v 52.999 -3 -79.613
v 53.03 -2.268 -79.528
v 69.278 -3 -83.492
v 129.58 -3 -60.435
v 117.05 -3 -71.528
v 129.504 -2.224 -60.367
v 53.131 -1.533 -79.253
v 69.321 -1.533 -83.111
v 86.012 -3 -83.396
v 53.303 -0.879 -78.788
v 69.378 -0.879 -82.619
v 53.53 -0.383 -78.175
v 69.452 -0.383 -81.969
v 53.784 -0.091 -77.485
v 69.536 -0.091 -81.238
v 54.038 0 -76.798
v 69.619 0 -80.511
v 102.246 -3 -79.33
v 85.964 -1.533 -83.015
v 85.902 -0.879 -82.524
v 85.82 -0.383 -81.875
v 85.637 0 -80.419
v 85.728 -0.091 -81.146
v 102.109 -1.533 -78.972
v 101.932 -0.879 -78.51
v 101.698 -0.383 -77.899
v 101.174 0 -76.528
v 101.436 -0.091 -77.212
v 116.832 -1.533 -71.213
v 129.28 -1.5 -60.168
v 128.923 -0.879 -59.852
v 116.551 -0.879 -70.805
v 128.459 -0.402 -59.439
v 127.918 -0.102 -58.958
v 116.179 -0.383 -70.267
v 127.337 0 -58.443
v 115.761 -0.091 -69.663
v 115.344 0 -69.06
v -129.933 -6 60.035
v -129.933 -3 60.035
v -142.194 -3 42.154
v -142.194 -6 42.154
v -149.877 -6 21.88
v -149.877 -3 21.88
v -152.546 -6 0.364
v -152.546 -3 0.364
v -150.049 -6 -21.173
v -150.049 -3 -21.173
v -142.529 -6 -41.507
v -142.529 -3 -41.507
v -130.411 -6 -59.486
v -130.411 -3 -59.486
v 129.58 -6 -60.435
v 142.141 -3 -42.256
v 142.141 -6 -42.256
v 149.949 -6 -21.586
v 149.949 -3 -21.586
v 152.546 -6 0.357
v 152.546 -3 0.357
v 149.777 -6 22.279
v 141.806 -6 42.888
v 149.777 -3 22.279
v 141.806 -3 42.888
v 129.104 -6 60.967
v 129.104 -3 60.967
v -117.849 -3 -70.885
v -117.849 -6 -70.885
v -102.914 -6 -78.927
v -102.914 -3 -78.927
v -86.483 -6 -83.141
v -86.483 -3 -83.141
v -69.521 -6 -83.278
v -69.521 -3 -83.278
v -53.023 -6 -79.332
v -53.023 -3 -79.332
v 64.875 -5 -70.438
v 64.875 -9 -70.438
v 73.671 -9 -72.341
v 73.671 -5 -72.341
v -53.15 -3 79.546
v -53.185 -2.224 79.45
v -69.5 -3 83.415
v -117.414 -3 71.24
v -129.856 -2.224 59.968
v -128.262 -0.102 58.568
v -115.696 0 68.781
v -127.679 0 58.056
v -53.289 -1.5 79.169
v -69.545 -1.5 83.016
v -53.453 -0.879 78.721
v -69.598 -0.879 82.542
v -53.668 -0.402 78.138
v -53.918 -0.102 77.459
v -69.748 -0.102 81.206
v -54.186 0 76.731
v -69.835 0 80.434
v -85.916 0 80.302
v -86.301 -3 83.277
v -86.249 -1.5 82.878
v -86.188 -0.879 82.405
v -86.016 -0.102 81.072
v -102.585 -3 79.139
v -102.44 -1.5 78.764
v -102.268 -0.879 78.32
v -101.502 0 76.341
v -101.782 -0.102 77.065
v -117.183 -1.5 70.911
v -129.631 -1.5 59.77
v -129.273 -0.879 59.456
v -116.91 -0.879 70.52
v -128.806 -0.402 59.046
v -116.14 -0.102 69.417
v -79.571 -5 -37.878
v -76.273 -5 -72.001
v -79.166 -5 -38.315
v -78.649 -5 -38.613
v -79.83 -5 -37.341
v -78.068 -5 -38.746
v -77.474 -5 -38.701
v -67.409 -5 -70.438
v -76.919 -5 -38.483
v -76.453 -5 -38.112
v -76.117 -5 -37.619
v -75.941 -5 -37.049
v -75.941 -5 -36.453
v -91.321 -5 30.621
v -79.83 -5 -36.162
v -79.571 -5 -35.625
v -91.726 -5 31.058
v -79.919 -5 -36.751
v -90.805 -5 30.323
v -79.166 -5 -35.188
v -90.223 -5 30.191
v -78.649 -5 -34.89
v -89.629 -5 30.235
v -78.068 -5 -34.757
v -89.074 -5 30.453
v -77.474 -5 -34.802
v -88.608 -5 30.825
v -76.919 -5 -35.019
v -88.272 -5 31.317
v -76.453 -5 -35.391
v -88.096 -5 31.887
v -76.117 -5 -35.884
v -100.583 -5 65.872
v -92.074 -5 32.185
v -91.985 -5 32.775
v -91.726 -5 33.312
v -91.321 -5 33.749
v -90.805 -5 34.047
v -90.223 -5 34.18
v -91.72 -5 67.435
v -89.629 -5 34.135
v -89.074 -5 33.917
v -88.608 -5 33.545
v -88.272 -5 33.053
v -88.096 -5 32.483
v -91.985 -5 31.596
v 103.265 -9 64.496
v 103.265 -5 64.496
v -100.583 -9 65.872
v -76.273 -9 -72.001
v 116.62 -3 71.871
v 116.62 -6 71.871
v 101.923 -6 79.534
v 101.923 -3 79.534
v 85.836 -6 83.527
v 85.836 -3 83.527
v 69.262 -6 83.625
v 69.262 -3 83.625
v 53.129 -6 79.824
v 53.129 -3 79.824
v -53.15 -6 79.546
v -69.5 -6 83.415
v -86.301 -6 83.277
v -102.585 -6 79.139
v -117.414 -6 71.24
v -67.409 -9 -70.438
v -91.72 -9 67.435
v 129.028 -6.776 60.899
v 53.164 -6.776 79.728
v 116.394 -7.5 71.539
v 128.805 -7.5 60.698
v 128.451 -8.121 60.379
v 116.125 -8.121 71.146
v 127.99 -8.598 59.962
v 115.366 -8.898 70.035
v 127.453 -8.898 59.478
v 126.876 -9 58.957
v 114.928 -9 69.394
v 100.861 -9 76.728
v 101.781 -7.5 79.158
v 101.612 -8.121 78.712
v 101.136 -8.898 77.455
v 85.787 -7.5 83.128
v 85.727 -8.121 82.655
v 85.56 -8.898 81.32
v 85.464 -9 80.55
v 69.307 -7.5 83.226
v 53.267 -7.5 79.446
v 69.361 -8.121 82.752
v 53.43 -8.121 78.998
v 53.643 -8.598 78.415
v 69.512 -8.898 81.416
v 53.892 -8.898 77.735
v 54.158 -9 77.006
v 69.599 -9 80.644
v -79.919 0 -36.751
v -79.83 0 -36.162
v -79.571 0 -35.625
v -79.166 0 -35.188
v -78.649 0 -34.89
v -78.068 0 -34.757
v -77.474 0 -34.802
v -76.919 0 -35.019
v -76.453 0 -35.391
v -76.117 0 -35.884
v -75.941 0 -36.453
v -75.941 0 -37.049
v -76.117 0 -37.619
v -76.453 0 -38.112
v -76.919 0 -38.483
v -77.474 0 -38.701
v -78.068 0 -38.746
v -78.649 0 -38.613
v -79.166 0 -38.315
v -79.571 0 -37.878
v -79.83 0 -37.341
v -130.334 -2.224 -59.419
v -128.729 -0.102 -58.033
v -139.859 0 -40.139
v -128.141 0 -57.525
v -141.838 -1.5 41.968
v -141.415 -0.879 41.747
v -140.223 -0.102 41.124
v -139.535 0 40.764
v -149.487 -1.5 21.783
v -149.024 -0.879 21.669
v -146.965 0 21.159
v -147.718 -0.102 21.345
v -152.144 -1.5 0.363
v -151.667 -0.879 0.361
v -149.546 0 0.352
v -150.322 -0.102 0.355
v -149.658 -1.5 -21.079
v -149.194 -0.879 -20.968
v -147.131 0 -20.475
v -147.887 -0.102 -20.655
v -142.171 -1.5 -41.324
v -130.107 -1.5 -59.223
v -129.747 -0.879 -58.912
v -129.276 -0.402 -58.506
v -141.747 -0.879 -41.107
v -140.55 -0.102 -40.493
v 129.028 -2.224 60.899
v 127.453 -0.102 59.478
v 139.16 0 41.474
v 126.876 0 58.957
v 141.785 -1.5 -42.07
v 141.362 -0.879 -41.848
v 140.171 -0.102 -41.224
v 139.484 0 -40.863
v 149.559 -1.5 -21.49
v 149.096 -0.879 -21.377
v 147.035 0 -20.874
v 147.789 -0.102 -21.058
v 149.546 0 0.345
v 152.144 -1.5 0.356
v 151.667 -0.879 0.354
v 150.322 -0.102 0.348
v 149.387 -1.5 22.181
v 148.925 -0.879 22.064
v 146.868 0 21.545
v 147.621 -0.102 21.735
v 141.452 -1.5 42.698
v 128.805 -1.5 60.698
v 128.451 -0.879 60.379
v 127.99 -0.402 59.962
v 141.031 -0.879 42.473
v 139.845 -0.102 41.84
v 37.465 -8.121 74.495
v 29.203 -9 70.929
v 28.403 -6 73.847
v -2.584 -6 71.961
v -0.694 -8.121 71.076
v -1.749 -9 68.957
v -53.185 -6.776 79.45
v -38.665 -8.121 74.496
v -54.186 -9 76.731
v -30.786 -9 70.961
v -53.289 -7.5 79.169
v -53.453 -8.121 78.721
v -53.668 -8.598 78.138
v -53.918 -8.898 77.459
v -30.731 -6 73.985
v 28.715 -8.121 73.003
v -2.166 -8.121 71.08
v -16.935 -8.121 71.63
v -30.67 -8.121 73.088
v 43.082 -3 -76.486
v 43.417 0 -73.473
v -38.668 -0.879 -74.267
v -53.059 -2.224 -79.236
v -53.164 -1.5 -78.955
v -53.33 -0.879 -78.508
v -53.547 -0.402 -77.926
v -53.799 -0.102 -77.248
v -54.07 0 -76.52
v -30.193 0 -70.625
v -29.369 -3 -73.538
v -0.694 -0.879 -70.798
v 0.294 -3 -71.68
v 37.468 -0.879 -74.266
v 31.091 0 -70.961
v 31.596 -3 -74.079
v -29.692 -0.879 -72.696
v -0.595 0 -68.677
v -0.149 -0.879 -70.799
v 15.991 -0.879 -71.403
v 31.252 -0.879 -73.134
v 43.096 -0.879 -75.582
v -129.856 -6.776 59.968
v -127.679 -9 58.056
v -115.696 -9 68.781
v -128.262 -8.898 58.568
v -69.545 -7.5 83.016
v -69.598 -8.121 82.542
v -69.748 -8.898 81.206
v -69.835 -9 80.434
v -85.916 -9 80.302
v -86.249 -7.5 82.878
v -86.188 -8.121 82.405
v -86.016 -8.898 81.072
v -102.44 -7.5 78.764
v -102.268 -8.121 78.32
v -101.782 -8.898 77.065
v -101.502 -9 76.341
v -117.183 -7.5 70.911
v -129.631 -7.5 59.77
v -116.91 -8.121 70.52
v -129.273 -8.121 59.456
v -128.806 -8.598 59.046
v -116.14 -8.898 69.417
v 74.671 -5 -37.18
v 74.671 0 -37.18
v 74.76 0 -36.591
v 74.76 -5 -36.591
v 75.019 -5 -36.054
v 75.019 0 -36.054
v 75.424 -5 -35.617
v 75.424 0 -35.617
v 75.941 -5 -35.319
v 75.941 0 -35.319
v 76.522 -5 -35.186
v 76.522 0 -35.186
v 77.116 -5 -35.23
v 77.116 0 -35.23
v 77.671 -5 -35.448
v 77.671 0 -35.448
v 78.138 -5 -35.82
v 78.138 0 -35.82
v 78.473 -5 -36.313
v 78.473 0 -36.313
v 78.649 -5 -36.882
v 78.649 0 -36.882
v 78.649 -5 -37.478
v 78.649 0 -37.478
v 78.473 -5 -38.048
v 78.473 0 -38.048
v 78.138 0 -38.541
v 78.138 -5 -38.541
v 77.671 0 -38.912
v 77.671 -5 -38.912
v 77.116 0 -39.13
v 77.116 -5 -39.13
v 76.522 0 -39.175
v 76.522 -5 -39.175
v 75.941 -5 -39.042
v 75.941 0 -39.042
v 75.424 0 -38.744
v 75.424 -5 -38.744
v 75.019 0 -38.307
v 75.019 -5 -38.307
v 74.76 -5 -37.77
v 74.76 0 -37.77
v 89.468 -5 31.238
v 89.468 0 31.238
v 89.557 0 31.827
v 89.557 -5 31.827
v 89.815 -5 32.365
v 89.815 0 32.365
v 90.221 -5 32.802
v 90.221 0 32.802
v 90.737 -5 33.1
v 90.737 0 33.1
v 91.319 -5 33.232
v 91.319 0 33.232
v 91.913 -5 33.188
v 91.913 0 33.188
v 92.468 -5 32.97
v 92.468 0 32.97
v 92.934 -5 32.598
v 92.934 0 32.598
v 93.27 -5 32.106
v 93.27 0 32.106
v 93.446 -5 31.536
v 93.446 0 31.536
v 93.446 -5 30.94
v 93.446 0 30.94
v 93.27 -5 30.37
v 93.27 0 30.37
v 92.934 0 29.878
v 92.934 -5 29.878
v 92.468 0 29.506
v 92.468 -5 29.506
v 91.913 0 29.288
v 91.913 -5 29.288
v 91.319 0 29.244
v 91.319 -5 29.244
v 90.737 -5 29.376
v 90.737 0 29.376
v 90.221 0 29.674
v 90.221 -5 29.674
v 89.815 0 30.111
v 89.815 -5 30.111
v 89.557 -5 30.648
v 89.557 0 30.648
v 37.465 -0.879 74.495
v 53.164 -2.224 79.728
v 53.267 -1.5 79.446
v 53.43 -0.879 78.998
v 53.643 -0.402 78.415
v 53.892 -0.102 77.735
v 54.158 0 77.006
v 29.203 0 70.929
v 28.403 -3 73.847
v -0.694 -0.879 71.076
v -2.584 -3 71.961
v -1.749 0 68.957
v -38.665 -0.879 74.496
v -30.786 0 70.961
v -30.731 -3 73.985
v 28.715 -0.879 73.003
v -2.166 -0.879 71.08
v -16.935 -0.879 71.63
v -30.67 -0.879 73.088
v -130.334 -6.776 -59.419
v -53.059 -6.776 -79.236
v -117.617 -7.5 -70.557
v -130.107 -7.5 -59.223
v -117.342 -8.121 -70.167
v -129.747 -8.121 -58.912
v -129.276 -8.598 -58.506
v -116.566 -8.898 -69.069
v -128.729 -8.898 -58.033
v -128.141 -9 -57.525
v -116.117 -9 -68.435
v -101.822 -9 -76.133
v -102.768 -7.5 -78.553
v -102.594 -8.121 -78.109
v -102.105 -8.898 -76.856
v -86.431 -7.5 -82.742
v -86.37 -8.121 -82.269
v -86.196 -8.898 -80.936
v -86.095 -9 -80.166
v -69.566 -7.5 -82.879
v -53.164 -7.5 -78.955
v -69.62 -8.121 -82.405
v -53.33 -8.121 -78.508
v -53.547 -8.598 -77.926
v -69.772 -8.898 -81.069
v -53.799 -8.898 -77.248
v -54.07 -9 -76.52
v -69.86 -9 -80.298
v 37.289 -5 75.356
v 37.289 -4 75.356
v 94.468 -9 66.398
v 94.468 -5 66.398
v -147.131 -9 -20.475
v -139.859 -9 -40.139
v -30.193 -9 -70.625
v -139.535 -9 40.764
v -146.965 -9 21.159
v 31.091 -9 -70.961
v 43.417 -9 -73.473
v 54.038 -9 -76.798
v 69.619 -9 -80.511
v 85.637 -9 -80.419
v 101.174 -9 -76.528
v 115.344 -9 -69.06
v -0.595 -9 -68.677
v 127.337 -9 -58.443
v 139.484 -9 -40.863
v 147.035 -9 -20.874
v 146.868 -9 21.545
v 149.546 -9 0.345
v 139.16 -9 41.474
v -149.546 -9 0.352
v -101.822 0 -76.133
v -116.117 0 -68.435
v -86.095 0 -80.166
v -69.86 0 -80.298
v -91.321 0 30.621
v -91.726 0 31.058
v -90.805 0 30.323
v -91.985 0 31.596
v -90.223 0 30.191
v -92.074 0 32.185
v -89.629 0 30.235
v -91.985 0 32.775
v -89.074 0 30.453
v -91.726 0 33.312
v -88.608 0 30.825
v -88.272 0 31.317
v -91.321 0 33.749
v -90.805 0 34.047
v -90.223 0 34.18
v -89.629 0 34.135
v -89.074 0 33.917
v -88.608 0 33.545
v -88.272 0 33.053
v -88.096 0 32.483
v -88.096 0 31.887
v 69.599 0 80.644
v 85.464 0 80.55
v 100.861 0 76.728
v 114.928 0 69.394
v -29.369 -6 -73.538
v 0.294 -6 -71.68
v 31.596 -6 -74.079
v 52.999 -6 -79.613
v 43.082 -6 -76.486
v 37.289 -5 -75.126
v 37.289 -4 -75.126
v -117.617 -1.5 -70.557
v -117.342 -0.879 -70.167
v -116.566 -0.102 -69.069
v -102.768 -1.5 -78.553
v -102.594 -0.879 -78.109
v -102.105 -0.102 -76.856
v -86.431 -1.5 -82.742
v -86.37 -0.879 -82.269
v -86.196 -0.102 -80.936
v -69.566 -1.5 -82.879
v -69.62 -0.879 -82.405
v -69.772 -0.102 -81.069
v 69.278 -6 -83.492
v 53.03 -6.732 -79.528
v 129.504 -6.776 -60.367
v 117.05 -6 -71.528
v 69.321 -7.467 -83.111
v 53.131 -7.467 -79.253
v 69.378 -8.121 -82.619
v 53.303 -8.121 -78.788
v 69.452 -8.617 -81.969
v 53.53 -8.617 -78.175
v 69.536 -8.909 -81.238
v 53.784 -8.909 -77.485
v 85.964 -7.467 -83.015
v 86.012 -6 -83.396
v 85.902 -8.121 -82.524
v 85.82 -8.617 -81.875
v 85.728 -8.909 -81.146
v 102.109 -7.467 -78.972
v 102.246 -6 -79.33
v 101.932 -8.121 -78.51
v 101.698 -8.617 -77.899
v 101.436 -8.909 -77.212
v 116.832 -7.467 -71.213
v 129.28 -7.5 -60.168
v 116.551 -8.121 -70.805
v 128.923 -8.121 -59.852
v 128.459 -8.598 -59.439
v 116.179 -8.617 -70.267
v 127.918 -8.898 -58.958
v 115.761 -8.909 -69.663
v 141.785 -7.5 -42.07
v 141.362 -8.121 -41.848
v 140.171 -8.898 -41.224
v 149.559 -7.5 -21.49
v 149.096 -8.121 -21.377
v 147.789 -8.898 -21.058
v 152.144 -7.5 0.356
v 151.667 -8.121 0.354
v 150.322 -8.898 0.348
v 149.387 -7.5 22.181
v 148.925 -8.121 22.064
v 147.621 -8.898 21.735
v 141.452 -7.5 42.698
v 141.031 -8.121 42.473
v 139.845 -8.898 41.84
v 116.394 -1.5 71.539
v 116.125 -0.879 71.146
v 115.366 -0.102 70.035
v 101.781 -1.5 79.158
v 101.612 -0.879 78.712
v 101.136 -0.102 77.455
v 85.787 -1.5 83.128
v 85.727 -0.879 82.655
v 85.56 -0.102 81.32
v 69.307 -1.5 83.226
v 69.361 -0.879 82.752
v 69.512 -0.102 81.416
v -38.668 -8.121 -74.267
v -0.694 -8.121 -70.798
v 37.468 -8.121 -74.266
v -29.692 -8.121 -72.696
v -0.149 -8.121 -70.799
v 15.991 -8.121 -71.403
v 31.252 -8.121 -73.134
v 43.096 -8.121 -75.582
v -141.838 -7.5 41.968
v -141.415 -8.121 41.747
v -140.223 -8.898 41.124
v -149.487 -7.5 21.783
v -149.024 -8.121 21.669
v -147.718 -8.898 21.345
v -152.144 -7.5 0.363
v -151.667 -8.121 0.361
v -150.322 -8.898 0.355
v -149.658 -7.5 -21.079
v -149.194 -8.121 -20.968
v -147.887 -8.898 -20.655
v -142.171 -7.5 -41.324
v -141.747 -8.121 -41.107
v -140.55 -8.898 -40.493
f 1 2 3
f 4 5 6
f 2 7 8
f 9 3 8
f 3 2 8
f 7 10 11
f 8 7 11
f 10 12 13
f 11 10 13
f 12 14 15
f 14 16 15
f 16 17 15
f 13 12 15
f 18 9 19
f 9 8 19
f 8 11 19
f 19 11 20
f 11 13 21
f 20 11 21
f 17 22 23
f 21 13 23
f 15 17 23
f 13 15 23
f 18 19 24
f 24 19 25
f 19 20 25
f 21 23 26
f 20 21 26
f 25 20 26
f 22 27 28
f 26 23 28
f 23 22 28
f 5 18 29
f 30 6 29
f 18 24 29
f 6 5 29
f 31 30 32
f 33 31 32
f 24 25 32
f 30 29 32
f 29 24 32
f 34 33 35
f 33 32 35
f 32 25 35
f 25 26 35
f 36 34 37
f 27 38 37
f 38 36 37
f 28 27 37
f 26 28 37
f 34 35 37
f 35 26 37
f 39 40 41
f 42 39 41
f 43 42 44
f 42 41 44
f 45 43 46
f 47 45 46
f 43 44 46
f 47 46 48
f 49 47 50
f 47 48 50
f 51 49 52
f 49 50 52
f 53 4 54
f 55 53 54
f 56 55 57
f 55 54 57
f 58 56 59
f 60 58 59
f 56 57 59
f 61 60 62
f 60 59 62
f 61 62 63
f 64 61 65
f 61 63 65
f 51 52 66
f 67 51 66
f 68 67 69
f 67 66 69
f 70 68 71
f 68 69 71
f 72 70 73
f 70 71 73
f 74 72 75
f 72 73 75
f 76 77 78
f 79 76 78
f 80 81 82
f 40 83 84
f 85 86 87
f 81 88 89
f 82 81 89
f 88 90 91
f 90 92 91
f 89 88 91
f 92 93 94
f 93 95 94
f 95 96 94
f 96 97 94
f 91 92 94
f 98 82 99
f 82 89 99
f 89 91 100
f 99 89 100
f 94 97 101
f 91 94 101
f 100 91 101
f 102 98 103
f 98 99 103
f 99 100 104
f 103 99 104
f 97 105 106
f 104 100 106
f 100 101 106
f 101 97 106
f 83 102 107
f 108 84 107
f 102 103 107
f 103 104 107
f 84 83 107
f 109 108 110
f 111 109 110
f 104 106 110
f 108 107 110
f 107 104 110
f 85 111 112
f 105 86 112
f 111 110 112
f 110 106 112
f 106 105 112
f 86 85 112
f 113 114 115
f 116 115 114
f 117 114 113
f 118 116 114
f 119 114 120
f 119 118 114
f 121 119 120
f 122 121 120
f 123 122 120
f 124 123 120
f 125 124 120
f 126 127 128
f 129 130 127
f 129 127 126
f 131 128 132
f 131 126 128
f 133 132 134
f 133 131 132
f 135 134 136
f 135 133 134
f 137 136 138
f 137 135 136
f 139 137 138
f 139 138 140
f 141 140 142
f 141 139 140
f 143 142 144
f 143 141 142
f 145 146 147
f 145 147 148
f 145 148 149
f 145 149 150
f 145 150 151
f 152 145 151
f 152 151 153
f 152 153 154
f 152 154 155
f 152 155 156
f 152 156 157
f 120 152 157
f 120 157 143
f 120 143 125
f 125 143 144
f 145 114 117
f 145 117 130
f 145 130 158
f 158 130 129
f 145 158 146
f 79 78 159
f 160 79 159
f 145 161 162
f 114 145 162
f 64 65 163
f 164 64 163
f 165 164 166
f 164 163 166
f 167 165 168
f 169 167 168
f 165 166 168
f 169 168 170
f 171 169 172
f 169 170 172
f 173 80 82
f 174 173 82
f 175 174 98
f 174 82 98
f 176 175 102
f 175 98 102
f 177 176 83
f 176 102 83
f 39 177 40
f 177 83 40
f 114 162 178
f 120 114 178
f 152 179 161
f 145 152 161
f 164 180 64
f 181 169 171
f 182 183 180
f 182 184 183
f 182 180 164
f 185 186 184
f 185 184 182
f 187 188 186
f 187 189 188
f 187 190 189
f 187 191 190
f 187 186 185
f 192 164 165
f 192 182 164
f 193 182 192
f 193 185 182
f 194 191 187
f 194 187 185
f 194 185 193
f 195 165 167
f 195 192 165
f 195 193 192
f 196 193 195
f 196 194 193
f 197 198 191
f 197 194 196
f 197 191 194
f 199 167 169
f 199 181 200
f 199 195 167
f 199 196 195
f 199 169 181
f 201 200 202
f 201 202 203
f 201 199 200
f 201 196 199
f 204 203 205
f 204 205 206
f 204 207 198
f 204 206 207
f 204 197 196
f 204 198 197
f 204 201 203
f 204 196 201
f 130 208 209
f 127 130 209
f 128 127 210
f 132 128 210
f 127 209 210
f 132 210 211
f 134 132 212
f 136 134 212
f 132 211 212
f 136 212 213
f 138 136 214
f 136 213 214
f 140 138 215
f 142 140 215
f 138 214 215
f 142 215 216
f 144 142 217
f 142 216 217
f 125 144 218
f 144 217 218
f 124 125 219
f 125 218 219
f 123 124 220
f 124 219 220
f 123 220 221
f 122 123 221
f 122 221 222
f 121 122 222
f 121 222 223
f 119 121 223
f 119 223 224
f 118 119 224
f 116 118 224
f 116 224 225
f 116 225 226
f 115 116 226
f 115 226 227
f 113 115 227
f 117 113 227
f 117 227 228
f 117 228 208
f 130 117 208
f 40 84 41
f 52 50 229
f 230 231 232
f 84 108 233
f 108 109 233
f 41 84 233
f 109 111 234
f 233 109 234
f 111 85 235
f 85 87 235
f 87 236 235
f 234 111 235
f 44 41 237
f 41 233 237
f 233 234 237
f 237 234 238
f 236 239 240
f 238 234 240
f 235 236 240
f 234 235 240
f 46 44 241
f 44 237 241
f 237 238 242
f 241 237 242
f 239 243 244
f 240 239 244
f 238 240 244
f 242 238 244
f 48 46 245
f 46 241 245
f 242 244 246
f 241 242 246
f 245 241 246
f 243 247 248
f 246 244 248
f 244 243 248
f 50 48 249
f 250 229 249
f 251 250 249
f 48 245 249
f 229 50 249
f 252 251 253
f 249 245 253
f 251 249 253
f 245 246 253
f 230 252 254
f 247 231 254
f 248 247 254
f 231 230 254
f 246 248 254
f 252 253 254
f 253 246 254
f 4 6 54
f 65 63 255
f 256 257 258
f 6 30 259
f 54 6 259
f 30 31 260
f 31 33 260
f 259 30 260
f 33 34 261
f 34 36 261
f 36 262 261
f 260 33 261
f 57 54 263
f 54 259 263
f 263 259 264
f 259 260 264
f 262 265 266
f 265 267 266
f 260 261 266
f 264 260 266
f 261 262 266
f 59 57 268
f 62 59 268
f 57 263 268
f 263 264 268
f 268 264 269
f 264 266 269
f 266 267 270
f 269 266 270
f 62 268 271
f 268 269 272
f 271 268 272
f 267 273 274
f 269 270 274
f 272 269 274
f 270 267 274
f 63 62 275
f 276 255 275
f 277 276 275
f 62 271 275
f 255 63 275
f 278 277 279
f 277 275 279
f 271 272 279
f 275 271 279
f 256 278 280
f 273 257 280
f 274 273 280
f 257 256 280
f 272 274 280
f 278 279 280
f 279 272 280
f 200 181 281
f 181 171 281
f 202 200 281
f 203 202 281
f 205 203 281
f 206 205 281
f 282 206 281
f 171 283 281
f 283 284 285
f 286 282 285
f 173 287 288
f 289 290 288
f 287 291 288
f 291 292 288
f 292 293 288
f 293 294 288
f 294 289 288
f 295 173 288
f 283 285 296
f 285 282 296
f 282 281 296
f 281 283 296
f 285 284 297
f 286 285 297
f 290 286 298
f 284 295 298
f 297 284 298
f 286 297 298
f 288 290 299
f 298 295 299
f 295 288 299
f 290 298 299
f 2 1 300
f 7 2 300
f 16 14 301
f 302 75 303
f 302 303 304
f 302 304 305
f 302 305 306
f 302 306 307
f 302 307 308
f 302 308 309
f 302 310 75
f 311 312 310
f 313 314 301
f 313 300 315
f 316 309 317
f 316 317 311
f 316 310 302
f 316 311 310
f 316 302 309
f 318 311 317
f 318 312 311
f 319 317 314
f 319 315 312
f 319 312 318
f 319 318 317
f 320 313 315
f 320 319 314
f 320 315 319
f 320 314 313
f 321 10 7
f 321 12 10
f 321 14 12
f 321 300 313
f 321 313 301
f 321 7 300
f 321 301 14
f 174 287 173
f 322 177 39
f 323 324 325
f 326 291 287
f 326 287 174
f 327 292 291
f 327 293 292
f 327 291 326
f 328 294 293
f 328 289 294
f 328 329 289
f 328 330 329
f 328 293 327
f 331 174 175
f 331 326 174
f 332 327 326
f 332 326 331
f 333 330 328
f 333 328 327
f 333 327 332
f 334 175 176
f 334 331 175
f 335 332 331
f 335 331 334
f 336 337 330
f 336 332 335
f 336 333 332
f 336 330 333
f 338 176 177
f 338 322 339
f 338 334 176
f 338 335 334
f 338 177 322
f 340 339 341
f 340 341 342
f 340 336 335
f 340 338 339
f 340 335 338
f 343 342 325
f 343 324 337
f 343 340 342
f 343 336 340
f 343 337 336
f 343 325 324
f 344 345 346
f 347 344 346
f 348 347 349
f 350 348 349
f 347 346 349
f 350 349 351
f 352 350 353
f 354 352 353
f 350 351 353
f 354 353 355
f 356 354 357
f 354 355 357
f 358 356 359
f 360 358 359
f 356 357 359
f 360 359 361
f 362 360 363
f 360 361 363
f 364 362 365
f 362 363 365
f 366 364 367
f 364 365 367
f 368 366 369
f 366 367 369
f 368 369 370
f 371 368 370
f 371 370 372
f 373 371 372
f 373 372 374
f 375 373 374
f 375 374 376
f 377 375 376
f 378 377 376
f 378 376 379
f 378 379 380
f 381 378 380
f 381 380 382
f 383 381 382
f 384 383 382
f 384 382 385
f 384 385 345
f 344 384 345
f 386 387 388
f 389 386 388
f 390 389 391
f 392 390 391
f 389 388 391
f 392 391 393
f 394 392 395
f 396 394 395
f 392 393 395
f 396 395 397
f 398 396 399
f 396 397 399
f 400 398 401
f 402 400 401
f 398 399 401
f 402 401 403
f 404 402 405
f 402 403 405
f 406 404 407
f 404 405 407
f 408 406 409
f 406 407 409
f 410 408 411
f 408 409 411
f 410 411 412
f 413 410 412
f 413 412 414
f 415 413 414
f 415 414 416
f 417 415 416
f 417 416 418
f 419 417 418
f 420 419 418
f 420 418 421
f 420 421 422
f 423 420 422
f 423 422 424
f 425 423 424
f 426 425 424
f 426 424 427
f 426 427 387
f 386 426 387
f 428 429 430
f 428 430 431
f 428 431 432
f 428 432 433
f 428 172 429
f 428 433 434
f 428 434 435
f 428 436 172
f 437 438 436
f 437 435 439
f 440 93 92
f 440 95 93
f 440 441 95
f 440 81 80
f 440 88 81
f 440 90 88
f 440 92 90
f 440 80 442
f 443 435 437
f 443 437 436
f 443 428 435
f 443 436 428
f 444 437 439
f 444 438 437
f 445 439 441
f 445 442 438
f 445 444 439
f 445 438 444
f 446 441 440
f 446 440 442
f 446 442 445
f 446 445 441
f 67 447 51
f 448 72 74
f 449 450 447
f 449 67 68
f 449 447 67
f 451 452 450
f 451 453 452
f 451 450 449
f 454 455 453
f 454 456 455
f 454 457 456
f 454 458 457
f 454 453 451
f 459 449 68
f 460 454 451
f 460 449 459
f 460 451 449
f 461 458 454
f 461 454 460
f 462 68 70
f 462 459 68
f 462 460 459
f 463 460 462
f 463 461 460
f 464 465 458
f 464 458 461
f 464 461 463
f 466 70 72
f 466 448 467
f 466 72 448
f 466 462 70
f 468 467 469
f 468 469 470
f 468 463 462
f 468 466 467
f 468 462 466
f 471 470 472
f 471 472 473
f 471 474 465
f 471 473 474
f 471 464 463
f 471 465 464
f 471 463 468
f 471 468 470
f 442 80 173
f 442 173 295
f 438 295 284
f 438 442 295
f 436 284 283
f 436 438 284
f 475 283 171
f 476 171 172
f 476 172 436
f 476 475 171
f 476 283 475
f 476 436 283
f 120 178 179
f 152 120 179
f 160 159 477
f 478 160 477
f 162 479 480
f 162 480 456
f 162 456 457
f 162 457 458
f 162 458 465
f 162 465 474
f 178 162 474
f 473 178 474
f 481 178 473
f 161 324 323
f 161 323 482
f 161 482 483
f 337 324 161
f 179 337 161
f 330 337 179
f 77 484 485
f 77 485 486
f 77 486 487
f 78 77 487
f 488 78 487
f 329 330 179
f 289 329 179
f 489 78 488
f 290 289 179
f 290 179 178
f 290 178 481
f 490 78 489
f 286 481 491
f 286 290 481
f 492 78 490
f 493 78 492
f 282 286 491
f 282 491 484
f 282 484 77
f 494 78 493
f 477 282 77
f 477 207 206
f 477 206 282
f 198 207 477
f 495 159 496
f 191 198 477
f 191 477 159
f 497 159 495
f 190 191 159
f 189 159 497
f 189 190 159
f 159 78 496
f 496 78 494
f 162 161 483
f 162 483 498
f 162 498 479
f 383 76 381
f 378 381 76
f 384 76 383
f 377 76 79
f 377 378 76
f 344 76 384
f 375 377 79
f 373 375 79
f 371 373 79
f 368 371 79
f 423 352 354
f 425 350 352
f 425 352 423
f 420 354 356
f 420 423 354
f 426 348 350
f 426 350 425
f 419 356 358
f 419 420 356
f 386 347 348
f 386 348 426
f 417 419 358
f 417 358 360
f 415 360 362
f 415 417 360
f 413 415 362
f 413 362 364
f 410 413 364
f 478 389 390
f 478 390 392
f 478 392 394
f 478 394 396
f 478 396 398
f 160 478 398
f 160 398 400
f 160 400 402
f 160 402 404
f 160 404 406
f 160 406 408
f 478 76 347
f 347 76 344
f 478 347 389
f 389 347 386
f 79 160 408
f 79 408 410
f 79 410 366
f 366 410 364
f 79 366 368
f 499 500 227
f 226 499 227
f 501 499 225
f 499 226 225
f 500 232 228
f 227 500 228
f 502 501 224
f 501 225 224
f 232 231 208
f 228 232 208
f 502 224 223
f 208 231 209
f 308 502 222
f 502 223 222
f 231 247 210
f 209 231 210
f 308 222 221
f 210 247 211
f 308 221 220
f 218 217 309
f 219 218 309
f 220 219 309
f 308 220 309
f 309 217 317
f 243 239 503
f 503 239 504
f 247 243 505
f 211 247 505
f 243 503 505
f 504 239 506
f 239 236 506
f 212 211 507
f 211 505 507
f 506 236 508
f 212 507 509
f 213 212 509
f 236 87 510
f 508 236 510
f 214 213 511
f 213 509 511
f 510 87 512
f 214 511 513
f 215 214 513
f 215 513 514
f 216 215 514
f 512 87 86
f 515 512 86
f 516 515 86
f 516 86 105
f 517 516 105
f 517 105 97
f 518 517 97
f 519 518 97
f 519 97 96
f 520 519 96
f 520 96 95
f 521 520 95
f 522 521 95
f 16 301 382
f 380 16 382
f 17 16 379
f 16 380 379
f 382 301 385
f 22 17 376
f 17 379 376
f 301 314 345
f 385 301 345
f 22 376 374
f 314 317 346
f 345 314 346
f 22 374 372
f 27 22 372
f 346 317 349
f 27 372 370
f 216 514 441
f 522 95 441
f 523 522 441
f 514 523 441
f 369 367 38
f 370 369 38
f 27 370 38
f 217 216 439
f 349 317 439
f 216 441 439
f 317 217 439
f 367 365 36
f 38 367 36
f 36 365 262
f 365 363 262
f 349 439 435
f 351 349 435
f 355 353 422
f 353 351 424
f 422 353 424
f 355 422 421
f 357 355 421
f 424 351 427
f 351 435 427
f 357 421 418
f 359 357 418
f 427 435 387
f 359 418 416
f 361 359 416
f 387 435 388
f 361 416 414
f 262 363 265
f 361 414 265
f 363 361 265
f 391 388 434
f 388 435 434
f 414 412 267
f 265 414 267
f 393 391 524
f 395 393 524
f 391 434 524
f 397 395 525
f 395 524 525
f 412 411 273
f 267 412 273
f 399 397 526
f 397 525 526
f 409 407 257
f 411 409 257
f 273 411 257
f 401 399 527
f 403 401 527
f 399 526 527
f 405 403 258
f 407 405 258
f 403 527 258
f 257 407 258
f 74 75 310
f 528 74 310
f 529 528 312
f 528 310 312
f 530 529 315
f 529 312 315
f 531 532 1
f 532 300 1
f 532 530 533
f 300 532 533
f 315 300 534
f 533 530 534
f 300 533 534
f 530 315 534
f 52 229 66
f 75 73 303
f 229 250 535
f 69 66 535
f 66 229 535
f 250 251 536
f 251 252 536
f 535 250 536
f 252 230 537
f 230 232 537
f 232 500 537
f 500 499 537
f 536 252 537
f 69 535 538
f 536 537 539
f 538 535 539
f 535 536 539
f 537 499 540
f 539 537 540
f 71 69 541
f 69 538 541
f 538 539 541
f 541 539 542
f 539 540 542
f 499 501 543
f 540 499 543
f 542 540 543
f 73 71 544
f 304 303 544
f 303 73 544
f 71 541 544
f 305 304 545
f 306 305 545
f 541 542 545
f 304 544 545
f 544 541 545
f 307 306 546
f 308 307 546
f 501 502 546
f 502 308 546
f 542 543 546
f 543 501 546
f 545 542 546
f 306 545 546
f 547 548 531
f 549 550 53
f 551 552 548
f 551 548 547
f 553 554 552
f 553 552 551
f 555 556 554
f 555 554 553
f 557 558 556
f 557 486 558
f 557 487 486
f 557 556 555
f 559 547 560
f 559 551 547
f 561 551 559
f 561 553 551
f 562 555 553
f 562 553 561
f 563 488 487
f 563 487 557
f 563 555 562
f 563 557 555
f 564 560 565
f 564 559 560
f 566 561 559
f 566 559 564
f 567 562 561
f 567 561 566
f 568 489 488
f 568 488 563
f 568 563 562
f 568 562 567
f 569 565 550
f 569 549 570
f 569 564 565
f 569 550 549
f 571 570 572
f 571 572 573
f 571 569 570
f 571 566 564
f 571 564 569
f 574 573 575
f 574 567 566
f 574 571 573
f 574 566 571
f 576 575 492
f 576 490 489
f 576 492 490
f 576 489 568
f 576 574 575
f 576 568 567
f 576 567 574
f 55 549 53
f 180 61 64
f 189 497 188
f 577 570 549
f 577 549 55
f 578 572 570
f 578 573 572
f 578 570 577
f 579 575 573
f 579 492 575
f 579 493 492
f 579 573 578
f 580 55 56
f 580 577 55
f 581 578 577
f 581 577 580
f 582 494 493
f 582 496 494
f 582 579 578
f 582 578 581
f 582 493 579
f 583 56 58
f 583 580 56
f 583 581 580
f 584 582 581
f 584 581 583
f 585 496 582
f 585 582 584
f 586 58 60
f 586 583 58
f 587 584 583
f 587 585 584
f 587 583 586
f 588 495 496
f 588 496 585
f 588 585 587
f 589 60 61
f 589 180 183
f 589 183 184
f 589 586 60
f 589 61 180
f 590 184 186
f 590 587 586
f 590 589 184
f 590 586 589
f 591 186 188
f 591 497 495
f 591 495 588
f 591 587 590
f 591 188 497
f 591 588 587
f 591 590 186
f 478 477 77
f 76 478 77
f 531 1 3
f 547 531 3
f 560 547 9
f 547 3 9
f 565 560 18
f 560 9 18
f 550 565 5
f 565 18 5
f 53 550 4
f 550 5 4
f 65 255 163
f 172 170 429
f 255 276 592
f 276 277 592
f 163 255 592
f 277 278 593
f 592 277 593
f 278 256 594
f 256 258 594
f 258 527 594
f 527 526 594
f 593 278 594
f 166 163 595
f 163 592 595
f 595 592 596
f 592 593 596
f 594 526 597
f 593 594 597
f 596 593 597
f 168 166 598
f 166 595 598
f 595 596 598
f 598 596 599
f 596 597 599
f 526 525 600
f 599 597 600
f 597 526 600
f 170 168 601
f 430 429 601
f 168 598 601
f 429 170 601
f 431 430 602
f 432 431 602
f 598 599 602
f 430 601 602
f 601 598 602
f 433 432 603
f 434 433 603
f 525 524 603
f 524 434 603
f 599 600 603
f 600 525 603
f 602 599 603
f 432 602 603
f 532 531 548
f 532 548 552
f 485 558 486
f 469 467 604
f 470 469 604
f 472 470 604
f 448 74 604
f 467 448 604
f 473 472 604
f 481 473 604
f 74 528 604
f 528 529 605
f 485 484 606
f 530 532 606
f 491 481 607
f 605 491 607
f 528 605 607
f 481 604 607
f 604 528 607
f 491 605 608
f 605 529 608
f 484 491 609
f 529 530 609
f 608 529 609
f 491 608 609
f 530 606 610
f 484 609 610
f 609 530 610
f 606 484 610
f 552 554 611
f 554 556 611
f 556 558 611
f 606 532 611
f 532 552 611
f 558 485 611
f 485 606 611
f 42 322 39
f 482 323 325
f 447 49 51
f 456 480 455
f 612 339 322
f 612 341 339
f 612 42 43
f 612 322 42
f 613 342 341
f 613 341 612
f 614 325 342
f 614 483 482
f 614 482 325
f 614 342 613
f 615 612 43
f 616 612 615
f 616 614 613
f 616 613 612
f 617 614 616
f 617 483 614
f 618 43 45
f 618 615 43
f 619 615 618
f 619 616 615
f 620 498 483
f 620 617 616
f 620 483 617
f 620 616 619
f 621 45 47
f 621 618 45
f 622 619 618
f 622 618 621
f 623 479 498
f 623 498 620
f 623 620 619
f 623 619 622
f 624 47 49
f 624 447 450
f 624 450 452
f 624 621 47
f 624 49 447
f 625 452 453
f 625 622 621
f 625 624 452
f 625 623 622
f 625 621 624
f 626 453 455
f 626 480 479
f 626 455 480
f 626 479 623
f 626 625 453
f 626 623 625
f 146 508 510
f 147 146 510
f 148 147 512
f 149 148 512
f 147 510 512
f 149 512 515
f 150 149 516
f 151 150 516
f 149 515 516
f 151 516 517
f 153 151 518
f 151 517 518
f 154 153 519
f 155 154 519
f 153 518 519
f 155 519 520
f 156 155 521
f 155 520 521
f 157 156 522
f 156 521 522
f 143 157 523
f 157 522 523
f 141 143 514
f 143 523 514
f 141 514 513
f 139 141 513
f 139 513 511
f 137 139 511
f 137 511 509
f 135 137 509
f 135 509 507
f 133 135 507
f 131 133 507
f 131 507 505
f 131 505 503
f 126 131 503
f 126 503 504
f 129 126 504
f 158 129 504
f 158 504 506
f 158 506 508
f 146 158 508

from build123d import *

# Parameters (mm, degrees)
F1_DEPTH = 9
F3_R     = 3
F4_DEPTH = 4
F6_D     = 4


with BuildPart() as f1:
    # F0 (on Front) → F1 (new body)
    with BuildSketch(Plane.XZ):
        with BuildLine():
            ThreePointArc((-53.1497258364, 79.5460974403), (-94.56723042, 81.6982905812), (-129.933253949, 60.0352806103))
            ThreePointArc((-129.933253949, 60.0352806103), (-152.5456475155, 0.3641086136), (-130.4114859728, -59.4861044443))
            ThreePointArc((-130.4114859728, -59.4861044443), (-94.8267257051, -81.5334878267), (-53.0234392177, -79.3317802685))
            add(Edge.make_bspline(
                [(-53.0234392177, -79.3317802685), (-48.6608082648, -77.7082088333), (-24.6397852476, -70.4889476448), (23.7505923387, -70.5665306527), (48.2937092789, -77.8753902125), (52.9987360366, -79.6127570647)],
                knots=[0.192962823, 0.192962823, 0.192962823, 0.192962823, 0.2940919494, 0.7017955969, 0.810107416, 0.810107416, 0.810107416, 0.810107416], degree=3))
            ThreePointArc((52.9987360366, -79.6127570647), (94.2508745118, -81.8498183409), (129.5801249251, -60.4351636118))
            ThreePointArc((129.5801249251, -60.4351636118), (152.5456748781, 0.3572045933), (129.1035766867, 60.9674062841))
            ThreePointArc((129.1035766867, 60.9674062841), (93.9984455084, 82.0081589209), (53.1289942993, 79.8237907218))
            add(Edge.make_bspline(
                [(-53.1497258364, 79.5460974403), (-48.7515954924, 77.9273408187), (-24.7040875075, 70.7832354564), (23.8166554522, 70.8602953804), (48.3873163026, 78.0925624494), (53.1289942993, 79.8237907218)],
                knots=[0.1918397391, 0.1918397391, 0.1918397391, 0.1918397391, 0.2939558653, 0.7019159659, 0.8112404118, 0.8112404118, 0.8112404118, 0.8112404118], degree=3))
        make_face()
    extrude(amount=F1_DEPTH)

    # F3
    f3_edges = [f1.edges().sort_by_distance(p)[0] for p in [
        (-94.56723, -9, 81.698291),
        (0.004128, -9, 71.956269),
        (93.998446, -9, 82.008159),
        (152.545675, -9, 0.357205),
        (94.250875, -9, -81.849818),
        (0.002547, -9, -71.678393),
        (-94.826726, -9, -81.533488),
        (-152.545648, -9, 0.364109),
        (-94.56723, 0, 81.698291),
    ]]
    fillet(f3_edges, radius=F3_R)

    # F2 (on face) → F4 (cut)
    with BuildSketch(Plane.XZ.offset(9)):
        Polygon((94.4679220363, 66.3983235541), (64.8748605741, -70.4382604186), (73.6714981152, -72.3406715126), (103.2645595774, 64.4959124601), align=None)
        Polygon((-76.2725546155, -72.0010940176), (-67.4092848384, -70.4382604186), (-91.7200297117, 67.4348250031), (-100.5832994888, 65.8719914041), align=None)
    extrude(amount=-F4_DEPTH, mode=Mode.SUBTRACT)

    # F6 (through all)
    with Locations(Plane.XZ.offset(9)):
        with Locations((-90.0739783819, 32.1851368482), (-77.9186059453, -36.7514058626), (76.6714447102, -37.1803199724), (91.4679754413, 31.2379720139)):
            Hole(F6_D / 2)


solid = f1.part
